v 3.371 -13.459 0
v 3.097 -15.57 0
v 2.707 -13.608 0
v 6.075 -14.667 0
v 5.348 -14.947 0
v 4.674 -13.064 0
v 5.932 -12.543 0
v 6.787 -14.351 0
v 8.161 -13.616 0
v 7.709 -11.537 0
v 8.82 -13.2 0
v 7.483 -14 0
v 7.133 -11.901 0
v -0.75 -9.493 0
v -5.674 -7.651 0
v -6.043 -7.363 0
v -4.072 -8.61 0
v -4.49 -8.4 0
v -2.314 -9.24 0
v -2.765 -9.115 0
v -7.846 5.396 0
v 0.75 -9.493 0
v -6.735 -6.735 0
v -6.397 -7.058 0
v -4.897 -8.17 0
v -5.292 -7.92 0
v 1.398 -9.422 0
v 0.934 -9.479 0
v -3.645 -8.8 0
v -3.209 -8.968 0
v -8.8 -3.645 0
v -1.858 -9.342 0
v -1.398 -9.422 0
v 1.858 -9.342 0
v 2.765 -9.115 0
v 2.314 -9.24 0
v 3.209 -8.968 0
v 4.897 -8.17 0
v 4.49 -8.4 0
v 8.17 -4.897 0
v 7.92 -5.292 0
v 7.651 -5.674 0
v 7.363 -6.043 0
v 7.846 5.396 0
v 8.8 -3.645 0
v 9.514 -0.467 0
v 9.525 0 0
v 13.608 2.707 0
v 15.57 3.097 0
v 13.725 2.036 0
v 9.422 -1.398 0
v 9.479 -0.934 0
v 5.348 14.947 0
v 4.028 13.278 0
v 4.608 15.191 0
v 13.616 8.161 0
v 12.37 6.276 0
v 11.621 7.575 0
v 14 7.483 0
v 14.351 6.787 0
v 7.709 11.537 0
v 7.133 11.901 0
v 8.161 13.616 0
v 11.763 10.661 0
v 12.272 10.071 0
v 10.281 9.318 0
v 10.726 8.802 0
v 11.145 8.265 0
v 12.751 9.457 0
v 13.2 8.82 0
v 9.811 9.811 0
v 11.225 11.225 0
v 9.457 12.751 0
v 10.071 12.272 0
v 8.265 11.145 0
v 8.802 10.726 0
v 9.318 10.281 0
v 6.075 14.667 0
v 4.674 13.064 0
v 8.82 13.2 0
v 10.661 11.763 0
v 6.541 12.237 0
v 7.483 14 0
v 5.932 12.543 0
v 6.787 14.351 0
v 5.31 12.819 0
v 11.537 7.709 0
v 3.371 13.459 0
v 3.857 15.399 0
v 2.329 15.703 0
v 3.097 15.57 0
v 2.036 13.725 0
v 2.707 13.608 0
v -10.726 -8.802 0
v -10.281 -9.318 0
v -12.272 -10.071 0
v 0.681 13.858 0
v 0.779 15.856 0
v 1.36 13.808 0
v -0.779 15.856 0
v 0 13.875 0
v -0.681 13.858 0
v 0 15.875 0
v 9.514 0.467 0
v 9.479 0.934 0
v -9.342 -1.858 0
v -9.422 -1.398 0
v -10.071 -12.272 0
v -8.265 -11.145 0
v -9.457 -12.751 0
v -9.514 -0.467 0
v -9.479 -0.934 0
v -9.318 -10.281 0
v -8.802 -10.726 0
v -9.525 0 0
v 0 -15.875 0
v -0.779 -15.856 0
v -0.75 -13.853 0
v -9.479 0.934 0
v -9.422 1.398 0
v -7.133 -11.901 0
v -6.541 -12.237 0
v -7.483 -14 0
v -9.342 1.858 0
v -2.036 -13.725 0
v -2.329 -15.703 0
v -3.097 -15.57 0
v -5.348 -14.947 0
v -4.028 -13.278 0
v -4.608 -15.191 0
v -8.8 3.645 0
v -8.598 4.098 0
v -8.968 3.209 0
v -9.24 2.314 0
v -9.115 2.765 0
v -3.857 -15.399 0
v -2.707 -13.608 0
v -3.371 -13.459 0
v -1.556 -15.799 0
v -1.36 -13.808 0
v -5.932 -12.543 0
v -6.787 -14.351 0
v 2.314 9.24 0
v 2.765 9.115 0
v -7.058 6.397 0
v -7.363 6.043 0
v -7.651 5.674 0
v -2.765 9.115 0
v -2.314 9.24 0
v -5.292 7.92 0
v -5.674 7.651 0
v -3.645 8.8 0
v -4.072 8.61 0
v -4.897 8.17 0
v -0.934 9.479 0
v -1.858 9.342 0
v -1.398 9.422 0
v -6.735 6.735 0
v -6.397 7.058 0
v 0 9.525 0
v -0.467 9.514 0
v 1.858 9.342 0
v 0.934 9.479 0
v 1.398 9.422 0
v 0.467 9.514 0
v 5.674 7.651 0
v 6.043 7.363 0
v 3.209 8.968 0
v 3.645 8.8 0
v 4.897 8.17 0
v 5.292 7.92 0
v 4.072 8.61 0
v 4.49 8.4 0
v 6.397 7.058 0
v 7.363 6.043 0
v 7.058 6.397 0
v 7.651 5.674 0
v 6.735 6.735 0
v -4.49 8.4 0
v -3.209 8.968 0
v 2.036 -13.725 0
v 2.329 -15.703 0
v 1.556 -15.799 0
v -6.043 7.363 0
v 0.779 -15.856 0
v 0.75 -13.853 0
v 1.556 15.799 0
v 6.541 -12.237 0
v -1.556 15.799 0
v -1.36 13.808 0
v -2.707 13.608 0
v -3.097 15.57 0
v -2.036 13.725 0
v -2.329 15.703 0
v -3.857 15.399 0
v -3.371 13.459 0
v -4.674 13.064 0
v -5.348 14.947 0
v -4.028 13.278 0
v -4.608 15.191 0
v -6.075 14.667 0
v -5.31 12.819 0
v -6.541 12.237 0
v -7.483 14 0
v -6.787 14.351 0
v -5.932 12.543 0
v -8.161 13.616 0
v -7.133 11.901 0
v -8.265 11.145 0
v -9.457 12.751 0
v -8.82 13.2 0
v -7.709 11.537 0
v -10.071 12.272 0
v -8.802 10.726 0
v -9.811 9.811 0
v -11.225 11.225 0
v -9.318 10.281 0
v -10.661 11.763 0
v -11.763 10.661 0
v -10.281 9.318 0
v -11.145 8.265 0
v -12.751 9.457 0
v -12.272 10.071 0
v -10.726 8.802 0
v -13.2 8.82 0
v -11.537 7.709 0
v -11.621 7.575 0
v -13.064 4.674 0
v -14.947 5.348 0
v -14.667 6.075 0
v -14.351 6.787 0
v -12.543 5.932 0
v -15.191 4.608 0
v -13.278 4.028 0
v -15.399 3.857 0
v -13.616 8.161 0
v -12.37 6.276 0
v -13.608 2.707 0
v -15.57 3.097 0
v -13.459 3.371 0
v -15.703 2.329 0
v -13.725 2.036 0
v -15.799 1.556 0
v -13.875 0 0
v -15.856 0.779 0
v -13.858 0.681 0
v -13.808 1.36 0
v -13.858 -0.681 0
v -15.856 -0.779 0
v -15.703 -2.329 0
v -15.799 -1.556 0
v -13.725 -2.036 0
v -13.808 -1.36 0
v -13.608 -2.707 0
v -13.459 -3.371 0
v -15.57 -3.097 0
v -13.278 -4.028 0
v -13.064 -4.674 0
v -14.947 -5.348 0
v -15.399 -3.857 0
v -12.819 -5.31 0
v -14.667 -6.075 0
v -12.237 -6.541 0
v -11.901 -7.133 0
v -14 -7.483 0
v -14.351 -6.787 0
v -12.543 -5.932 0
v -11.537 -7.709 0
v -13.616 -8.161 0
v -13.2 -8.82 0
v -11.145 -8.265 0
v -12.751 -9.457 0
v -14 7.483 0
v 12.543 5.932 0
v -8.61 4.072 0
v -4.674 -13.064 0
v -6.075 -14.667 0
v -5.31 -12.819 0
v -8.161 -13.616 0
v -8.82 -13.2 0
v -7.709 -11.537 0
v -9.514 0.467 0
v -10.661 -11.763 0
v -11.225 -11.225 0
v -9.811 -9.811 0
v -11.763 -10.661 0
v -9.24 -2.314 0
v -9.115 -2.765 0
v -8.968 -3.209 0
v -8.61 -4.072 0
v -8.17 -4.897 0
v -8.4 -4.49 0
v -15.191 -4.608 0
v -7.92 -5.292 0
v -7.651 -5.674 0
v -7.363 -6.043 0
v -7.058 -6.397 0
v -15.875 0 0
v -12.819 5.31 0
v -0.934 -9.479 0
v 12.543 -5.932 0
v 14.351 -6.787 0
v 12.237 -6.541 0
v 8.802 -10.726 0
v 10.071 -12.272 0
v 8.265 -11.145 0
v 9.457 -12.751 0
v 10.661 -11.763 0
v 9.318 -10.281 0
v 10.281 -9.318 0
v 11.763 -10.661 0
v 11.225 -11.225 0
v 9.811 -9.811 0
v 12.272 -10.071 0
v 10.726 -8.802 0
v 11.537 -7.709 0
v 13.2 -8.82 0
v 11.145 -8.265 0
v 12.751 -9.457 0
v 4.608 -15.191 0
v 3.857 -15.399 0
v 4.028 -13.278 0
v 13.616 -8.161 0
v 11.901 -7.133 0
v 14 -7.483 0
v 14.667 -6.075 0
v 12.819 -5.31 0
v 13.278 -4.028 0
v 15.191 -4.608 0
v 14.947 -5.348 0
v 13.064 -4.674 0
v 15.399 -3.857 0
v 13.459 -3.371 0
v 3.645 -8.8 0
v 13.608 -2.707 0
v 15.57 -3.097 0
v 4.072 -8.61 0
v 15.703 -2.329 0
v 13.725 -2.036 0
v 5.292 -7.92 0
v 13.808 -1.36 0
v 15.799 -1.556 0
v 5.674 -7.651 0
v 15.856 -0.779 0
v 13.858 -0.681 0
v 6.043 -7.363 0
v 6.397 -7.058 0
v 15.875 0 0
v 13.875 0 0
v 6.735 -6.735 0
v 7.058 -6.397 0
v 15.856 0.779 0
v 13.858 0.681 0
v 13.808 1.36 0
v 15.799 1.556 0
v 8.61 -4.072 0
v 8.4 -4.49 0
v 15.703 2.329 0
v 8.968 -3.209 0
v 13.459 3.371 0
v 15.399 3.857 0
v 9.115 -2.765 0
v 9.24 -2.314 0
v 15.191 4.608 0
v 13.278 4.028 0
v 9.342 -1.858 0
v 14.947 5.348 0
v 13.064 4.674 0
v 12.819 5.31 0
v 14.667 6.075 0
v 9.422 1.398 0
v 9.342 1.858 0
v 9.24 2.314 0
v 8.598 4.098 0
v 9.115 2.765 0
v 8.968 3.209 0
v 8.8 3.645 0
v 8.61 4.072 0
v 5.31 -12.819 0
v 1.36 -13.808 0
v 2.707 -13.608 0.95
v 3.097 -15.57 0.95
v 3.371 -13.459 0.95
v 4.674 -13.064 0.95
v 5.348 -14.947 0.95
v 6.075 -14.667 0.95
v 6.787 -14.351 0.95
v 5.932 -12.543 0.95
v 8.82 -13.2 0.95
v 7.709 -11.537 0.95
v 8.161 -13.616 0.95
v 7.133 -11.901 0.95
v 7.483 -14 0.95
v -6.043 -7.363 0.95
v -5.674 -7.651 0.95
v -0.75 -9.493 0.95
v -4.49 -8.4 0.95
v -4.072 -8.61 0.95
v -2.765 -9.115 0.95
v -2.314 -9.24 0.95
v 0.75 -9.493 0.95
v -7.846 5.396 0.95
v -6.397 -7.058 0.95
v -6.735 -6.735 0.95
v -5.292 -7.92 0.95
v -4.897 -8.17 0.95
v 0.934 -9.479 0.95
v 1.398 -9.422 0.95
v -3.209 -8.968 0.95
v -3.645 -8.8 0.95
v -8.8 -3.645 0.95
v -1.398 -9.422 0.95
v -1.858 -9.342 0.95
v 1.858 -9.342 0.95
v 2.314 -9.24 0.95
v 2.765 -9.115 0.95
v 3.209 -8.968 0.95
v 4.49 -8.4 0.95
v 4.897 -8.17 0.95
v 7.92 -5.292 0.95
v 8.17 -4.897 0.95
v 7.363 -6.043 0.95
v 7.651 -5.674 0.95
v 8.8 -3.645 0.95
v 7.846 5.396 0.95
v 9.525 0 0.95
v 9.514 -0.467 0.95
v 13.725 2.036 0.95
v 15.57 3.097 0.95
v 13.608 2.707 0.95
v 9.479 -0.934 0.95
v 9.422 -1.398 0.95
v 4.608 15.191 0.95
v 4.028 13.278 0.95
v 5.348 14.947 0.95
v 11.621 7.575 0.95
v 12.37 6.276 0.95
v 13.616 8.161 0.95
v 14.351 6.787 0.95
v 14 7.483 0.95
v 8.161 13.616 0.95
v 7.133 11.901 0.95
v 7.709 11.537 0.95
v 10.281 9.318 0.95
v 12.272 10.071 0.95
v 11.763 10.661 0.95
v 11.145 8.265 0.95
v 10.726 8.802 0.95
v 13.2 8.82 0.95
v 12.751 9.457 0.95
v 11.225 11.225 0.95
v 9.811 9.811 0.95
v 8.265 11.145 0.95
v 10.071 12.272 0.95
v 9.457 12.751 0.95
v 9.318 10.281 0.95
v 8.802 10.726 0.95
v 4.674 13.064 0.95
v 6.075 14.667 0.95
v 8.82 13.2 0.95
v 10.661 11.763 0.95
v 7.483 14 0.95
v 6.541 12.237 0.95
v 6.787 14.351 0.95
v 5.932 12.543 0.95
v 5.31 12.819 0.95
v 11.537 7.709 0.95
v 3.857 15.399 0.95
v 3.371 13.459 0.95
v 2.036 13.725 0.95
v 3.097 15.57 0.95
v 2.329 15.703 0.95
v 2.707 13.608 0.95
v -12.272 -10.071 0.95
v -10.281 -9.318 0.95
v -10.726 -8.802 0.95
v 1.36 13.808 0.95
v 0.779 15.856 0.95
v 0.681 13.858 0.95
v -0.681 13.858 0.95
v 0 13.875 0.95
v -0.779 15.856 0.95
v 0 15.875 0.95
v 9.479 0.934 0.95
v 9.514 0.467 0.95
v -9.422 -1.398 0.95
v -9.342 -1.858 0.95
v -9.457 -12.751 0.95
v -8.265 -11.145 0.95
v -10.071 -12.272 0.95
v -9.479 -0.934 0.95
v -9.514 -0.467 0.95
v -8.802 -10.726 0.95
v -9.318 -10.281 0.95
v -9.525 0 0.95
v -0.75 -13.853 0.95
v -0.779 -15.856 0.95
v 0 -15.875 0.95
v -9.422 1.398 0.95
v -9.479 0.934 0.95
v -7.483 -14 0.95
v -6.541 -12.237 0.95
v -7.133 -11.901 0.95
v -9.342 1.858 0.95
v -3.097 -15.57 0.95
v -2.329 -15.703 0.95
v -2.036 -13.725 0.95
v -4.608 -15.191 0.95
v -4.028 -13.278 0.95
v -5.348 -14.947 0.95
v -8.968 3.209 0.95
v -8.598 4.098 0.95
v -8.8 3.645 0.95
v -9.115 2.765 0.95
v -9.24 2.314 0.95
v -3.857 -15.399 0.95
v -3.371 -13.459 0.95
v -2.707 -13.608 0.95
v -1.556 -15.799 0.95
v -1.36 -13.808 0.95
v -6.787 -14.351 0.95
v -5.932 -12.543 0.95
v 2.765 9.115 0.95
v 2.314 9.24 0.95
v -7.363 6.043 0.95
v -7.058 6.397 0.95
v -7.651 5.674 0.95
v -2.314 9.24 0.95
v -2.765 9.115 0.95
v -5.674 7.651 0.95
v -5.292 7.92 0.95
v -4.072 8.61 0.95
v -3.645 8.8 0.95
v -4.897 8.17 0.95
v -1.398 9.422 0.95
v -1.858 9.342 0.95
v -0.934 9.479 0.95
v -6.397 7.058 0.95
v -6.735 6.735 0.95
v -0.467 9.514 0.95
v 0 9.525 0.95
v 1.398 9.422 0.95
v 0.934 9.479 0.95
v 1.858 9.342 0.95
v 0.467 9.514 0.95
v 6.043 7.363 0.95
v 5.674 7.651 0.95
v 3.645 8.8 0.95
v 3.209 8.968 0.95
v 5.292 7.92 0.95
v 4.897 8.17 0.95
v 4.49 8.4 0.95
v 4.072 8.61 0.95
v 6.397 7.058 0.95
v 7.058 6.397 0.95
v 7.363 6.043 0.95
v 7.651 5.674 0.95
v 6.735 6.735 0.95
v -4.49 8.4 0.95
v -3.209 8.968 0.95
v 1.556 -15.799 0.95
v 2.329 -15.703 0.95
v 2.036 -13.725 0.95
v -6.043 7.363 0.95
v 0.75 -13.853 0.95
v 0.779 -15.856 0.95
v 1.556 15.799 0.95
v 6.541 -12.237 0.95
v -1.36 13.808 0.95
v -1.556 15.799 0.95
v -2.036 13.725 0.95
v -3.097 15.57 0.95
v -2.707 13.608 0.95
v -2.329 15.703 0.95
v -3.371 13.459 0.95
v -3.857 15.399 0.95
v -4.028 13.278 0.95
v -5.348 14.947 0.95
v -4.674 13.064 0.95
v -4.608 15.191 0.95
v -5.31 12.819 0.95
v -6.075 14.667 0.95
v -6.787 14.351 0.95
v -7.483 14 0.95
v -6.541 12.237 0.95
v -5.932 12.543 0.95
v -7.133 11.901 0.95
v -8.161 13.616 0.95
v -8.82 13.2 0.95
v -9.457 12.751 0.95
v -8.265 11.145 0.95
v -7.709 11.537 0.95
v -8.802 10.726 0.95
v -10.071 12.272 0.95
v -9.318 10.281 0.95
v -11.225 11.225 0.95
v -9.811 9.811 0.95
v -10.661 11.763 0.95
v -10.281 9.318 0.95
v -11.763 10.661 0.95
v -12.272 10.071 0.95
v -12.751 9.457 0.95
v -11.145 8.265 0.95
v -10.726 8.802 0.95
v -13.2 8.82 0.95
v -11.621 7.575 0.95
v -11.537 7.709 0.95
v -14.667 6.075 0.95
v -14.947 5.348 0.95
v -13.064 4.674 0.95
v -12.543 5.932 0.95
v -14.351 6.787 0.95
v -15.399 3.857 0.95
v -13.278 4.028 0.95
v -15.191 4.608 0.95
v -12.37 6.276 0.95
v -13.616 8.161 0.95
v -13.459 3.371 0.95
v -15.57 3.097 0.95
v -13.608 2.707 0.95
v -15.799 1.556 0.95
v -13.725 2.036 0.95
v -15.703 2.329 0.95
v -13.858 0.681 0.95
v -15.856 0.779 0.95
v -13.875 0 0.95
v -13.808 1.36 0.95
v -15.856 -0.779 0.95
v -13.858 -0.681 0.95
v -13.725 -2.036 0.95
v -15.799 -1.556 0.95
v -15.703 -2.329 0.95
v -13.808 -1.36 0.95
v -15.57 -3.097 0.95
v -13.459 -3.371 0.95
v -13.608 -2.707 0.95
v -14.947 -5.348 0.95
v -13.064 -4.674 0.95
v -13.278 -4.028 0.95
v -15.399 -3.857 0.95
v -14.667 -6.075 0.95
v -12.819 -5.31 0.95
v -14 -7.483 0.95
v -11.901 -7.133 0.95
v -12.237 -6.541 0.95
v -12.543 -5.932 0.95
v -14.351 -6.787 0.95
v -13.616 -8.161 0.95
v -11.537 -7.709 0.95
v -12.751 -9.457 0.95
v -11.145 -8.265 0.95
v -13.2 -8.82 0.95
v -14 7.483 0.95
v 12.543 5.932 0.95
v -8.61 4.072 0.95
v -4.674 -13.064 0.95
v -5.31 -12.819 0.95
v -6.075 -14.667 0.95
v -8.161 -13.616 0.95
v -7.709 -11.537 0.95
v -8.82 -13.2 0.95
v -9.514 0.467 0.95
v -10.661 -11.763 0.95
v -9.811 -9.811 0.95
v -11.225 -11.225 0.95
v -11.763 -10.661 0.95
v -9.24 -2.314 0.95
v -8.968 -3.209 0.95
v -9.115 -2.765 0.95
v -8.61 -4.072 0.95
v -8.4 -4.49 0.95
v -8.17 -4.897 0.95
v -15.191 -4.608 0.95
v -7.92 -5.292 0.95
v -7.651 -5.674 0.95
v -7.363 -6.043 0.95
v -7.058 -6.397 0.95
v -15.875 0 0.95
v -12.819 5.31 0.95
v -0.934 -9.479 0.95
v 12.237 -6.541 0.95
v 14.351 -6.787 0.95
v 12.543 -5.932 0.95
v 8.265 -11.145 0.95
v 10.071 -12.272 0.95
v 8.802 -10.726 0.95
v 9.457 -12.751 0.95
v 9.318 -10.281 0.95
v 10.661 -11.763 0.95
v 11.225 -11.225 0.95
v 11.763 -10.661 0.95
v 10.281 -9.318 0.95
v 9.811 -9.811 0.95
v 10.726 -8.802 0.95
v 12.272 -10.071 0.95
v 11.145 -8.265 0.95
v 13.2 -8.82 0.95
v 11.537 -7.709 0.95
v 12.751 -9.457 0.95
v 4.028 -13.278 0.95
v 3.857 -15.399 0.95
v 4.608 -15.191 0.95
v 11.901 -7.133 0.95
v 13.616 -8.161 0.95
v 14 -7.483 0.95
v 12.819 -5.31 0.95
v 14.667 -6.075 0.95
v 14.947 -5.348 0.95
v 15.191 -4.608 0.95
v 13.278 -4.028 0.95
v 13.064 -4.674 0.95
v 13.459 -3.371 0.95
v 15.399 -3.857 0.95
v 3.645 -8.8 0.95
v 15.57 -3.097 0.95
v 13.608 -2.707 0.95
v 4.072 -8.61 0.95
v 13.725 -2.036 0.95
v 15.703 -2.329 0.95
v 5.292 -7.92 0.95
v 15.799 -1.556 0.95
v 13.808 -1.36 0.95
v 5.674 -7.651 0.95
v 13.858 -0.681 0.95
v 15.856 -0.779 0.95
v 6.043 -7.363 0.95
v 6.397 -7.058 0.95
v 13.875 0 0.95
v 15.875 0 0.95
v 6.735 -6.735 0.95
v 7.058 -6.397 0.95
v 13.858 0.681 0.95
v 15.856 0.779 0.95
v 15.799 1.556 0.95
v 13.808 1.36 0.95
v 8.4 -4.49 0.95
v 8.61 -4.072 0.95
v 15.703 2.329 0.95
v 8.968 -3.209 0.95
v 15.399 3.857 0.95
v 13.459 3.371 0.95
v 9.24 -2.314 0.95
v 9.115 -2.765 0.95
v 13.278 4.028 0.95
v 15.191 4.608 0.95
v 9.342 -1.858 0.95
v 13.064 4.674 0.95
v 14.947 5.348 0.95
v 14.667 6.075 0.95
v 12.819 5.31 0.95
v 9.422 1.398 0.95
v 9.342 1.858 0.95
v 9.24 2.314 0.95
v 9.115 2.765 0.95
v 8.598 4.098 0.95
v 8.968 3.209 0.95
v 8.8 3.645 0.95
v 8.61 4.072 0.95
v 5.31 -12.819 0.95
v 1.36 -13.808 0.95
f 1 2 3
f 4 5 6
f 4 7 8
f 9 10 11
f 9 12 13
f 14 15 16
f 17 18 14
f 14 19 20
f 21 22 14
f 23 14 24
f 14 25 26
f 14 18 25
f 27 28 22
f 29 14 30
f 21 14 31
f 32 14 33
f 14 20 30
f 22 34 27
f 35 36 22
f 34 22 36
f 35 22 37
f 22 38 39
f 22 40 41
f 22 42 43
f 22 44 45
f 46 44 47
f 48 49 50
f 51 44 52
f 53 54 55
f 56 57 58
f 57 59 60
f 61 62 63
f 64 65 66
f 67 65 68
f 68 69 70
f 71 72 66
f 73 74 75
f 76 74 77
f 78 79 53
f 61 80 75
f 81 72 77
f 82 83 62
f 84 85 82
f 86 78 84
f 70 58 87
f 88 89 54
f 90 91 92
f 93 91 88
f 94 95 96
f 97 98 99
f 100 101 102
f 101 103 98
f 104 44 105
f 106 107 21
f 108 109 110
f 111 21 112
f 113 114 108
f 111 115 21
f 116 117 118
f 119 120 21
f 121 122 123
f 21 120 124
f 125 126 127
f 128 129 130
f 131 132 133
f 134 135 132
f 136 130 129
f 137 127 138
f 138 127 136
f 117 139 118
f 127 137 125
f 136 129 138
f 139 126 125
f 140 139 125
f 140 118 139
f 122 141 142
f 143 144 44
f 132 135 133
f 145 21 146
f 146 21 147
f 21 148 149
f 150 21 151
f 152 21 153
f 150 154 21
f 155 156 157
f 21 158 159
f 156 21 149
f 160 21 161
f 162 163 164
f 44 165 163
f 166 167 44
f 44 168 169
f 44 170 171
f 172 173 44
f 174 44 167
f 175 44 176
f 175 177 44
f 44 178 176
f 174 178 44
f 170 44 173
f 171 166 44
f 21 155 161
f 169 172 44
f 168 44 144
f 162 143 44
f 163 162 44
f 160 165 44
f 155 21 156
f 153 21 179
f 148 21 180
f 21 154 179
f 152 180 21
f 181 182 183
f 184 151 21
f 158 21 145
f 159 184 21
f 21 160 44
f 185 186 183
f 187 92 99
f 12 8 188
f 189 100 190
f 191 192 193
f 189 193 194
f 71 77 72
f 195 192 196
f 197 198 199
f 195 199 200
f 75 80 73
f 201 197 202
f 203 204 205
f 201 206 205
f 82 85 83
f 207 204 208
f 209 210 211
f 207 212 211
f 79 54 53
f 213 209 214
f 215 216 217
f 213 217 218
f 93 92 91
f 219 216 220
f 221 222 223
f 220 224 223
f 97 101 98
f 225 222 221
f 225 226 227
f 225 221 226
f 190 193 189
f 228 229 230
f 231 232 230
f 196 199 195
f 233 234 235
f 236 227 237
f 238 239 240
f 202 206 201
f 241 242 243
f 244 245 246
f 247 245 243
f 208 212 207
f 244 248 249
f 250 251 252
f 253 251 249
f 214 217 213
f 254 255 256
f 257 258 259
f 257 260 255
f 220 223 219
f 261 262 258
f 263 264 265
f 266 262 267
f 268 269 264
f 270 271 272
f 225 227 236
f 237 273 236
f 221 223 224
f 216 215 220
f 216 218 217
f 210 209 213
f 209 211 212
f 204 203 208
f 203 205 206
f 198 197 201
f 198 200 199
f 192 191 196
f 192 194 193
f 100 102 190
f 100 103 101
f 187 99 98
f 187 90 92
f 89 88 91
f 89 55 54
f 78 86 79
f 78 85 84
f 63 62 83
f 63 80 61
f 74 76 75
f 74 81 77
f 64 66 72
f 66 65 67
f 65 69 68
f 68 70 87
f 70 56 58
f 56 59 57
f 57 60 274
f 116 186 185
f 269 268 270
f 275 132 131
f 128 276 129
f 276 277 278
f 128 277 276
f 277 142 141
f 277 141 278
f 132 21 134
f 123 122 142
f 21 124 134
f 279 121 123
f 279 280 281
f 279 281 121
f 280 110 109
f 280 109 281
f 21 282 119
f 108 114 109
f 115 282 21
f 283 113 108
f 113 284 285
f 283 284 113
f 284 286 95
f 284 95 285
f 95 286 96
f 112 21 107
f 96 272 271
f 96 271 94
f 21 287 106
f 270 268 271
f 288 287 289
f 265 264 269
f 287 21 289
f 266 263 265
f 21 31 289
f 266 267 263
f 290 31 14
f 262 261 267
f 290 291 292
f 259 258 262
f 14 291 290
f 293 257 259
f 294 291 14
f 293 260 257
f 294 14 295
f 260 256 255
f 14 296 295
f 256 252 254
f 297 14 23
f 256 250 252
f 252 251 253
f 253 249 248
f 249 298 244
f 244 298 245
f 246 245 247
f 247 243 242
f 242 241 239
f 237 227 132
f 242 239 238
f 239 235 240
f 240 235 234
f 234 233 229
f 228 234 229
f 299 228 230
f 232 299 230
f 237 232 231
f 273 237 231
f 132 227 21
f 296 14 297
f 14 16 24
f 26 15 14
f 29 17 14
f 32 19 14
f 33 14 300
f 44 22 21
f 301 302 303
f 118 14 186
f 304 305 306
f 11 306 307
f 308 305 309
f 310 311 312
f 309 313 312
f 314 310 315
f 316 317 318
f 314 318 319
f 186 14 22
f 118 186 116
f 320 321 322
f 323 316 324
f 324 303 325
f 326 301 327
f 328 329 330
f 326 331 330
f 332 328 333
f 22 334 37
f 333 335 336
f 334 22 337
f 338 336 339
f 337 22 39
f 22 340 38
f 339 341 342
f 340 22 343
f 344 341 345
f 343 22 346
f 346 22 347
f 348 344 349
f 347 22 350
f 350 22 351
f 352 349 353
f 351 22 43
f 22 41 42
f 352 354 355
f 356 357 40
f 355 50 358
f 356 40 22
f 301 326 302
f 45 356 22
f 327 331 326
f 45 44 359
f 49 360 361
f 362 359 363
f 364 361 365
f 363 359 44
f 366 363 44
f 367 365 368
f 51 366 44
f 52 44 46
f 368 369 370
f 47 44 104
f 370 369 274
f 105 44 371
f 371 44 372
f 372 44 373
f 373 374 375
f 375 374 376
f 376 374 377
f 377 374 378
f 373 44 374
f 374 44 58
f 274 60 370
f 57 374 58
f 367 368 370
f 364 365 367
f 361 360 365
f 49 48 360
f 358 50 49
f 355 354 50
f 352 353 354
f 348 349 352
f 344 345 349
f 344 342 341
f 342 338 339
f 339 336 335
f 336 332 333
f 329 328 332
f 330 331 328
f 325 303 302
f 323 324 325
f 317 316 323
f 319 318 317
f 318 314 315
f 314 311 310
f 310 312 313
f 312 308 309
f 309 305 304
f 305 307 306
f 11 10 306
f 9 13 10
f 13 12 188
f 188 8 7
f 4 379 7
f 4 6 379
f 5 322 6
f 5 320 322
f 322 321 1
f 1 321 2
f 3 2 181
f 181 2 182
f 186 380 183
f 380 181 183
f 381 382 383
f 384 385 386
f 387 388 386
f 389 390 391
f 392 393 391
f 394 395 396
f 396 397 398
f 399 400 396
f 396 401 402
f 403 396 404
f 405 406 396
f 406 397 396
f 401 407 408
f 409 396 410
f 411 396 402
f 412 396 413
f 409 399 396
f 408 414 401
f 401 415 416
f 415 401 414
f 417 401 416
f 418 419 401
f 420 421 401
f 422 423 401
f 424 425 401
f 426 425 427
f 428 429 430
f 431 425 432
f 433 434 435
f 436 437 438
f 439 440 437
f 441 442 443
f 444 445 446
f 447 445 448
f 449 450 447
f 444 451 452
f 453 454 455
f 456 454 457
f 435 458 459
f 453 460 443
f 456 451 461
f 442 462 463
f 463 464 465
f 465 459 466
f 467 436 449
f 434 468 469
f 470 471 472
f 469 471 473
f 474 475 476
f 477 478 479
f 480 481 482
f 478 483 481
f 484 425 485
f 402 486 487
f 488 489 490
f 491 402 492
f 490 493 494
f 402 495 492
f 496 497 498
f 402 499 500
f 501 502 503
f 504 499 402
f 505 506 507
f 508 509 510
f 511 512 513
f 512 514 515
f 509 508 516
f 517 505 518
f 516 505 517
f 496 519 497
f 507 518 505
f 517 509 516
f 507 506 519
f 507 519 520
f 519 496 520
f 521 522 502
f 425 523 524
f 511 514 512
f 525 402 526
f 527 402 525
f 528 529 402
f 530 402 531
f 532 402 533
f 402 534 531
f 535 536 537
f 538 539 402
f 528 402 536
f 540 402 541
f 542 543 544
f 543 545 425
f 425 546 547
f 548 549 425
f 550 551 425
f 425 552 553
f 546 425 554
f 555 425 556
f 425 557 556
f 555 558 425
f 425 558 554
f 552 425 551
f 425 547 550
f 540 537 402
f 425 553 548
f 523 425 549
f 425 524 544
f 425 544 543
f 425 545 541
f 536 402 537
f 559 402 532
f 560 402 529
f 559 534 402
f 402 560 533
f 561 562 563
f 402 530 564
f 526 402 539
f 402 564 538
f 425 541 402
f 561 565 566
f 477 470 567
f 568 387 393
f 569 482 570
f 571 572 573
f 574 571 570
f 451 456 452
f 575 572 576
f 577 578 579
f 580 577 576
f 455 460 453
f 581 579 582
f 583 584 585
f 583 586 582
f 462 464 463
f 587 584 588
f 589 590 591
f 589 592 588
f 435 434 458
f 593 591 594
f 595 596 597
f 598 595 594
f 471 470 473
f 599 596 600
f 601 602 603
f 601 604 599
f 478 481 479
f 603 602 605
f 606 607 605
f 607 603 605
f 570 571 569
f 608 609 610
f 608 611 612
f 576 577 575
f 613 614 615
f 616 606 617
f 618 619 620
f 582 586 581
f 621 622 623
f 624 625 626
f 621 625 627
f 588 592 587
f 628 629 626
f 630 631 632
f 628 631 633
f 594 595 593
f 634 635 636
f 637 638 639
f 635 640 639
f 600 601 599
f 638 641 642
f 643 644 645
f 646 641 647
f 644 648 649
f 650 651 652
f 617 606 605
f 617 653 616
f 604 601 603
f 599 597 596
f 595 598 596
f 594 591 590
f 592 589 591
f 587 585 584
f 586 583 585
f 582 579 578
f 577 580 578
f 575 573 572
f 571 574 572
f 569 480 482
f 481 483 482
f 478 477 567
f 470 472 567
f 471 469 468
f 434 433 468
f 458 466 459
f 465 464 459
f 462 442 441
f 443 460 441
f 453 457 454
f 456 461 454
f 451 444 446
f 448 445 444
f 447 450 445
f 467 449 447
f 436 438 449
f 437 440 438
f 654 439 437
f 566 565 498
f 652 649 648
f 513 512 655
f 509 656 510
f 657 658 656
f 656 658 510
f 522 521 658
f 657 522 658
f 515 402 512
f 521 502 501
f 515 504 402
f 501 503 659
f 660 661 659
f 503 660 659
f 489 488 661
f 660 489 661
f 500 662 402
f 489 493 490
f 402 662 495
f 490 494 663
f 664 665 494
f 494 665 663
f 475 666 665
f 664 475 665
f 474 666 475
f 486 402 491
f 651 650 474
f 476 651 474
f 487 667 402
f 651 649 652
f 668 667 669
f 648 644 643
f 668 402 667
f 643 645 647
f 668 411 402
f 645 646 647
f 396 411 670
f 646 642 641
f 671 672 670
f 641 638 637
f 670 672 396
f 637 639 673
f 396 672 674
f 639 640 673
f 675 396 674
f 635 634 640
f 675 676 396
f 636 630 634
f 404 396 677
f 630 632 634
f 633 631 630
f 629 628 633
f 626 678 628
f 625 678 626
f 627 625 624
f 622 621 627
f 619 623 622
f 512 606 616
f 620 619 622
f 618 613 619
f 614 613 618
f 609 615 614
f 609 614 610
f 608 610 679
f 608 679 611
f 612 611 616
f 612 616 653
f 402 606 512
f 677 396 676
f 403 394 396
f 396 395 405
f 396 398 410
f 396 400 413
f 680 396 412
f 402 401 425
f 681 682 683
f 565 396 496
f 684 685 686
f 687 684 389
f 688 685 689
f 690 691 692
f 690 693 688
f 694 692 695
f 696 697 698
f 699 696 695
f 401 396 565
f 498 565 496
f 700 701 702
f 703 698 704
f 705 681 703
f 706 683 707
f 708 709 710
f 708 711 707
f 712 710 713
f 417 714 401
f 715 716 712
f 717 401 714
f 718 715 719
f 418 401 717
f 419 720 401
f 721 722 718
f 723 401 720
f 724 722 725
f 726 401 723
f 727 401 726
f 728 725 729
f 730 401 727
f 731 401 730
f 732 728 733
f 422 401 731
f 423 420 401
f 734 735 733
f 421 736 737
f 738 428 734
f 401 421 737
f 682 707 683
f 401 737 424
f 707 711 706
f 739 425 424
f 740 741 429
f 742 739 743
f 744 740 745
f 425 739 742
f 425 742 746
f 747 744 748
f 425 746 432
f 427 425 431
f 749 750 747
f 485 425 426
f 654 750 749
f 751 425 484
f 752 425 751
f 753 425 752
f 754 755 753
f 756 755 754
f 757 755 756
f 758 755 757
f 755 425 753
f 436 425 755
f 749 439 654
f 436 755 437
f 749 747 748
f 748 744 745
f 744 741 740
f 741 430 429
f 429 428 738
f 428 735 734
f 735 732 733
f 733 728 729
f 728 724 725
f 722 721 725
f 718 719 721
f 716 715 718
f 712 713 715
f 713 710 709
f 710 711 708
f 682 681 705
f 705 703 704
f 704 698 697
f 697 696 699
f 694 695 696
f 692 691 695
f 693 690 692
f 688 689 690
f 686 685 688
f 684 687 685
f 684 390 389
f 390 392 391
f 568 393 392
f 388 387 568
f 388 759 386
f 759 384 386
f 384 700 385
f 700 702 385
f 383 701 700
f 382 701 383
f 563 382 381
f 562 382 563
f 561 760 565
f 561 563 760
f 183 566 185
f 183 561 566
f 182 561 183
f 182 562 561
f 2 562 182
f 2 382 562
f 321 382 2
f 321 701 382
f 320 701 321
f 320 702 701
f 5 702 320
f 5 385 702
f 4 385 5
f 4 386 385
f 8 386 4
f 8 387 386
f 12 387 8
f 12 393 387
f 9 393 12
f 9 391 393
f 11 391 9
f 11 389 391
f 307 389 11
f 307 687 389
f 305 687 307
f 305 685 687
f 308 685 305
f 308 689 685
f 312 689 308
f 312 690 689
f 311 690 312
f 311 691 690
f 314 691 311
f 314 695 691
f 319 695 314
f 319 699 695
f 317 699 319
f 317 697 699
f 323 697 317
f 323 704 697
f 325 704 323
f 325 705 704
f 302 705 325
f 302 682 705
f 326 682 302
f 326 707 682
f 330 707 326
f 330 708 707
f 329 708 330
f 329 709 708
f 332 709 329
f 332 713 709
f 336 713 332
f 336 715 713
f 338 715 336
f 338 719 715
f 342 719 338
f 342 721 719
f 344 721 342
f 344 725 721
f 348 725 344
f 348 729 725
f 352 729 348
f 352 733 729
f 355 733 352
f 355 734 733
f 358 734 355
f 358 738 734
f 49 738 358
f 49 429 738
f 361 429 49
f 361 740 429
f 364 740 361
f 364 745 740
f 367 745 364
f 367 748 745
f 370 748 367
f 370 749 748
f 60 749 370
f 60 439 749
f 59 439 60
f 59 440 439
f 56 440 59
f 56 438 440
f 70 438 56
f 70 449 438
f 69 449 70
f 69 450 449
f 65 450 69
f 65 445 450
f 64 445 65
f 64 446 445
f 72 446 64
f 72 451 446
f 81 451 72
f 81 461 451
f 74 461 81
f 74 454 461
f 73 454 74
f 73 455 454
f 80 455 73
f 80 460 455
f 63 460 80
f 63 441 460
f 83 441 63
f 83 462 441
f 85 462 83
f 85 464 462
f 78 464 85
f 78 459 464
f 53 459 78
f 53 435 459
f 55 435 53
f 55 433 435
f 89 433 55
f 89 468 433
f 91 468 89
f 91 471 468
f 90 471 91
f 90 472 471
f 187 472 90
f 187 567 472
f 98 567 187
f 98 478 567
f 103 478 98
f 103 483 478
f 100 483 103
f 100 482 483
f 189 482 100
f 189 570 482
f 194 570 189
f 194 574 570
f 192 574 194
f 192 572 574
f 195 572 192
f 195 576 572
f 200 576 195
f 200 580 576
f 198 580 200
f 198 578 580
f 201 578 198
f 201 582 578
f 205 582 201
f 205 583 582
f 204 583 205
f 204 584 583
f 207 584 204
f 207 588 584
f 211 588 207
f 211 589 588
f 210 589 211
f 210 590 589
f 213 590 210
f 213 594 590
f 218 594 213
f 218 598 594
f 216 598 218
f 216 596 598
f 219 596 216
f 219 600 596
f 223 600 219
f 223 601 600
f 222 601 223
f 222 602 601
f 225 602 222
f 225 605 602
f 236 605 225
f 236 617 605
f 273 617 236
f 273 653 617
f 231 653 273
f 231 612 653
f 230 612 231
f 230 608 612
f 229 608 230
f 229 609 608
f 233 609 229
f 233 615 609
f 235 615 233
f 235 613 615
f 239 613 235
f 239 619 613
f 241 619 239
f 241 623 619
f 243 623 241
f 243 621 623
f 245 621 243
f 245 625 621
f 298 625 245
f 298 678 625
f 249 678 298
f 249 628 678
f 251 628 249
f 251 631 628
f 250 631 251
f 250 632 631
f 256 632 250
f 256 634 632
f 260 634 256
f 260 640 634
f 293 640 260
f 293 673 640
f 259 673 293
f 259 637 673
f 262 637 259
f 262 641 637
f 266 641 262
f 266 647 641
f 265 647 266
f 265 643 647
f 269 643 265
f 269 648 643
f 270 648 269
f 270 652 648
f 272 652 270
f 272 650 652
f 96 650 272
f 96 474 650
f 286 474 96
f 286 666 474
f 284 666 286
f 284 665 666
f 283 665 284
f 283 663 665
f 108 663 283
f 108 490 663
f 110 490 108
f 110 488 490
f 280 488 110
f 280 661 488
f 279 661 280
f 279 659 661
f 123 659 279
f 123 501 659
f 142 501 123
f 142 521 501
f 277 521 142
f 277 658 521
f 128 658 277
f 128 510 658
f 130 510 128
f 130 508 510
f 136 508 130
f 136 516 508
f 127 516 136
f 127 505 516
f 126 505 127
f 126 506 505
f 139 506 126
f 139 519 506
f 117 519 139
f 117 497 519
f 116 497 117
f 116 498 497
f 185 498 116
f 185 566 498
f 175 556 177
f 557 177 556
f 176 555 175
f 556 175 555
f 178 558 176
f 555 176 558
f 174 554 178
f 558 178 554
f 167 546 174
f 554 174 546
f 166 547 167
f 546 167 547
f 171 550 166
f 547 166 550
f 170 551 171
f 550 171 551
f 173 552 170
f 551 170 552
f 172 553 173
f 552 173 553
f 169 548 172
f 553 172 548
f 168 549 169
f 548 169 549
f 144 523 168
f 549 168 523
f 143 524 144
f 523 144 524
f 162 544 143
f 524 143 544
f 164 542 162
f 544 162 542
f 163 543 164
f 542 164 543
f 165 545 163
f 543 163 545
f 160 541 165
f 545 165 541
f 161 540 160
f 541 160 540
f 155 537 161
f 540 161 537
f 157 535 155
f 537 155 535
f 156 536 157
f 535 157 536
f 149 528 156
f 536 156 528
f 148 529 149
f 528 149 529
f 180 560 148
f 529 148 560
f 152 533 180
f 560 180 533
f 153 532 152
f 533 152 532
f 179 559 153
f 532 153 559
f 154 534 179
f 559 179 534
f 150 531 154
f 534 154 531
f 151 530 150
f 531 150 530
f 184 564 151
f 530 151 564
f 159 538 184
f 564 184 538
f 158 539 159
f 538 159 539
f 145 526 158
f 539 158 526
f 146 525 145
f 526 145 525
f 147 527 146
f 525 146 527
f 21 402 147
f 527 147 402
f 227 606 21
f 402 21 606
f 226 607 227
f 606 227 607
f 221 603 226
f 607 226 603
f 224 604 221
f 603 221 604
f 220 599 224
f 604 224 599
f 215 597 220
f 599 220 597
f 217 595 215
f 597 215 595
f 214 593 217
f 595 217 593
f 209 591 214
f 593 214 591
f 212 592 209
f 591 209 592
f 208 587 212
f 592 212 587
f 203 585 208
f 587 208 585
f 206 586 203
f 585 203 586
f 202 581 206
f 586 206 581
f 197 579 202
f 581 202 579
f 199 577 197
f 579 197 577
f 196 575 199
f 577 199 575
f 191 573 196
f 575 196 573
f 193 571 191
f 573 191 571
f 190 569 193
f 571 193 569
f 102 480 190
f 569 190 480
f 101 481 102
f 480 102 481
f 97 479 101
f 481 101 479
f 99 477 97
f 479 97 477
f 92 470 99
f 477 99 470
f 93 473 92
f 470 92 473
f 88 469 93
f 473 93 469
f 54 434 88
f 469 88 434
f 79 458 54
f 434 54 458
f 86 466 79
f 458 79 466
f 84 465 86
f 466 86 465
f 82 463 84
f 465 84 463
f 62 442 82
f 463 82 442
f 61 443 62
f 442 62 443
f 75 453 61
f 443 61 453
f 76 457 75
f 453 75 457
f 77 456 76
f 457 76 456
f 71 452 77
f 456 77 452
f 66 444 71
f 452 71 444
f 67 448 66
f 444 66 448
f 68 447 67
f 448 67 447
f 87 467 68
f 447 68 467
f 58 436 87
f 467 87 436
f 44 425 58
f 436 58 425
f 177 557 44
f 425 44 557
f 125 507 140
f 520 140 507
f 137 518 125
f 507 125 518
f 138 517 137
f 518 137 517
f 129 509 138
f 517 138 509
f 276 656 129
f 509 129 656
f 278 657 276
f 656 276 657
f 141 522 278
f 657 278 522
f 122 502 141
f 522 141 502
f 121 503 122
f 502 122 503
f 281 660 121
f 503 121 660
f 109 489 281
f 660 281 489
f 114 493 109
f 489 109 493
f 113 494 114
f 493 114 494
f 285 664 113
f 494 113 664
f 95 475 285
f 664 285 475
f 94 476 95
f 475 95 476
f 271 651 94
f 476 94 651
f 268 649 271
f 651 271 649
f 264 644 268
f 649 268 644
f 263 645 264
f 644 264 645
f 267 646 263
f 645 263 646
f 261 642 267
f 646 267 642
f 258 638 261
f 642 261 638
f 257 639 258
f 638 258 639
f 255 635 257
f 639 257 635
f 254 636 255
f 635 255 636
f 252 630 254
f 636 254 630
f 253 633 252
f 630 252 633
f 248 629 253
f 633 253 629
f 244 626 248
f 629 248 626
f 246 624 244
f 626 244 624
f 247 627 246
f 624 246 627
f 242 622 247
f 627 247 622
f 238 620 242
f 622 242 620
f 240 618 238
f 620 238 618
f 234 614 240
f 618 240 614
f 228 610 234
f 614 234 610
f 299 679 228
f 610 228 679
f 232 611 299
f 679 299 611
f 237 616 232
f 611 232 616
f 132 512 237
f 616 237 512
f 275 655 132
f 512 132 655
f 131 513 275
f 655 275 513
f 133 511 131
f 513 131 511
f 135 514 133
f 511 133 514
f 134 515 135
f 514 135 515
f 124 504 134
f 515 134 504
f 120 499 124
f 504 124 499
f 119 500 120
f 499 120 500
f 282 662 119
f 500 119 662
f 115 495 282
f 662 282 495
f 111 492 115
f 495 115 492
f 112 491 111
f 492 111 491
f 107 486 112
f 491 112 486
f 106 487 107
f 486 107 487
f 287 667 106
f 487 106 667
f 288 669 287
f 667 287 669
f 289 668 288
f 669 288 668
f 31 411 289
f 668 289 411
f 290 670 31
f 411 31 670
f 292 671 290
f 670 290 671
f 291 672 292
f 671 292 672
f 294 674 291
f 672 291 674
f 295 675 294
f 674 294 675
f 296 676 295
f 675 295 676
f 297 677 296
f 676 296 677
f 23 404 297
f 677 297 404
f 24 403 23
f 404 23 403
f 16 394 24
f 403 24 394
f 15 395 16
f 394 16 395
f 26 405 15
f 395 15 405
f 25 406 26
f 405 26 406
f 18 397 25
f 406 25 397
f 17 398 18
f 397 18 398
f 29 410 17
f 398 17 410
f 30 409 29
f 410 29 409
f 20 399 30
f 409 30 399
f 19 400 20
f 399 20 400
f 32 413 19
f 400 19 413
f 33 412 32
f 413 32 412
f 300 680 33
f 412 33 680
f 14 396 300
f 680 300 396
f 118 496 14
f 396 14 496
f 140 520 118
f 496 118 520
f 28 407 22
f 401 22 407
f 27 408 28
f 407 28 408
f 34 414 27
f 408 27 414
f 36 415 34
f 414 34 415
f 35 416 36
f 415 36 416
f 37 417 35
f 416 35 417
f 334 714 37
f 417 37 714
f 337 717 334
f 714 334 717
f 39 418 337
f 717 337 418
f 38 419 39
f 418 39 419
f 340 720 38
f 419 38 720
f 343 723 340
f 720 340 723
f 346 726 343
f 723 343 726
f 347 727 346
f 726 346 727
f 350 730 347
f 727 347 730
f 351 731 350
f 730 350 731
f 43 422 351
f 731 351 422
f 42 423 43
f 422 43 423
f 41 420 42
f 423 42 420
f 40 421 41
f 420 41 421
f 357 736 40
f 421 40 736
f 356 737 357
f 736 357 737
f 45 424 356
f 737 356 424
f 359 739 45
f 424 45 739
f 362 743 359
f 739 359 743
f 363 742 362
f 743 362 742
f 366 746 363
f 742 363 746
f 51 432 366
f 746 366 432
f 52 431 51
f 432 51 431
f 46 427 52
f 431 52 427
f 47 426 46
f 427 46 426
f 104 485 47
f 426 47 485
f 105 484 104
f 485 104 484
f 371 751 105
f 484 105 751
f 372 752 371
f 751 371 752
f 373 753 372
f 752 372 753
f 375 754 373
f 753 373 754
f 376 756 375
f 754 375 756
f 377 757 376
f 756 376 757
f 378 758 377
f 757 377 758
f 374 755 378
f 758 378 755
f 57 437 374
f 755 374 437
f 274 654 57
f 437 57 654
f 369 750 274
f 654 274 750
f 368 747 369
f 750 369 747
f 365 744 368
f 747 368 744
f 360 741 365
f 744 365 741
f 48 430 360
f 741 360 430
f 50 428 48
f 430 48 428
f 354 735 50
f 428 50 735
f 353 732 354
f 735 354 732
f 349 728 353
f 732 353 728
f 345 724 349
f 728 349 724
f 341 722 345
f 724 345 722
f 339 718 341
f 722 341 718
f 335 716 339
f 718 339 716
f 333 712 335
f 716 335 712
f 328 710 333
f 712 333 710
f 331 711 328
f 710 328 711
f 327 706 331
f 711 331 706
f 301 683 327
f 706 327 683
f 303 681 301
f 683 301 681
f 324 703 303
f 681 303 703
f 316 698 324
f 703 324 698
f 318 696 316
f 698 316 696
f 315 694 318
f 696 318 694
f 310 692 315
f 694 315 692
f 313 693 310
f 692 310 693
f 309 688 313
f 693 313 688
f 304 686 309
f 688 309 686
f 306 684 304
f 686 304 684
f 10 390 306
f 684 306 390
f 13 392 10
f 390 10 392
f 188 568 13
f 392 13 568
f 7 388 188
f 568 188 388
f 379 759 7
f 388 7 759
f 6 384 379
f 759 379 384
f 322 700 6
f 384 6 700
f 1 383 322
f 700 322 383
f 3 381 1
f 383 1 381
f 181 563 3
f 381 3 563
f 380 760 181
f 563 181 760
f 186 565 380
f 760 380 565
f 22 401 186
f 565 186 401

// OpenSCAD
diameter = 31.75;
spotDiameterRatio = 0.6;
rim = 2;
strut = 1.5;
thickness = 0.95;
mode = 0; // [0:central dark,1:off-center hole,2:sector]
handle = 0; //[0:no,1:yes]

module dummy() {}

innerRadius = diameter/2-rim;

$fn = 128;

module handle() {
    hull() {
        circle(d=diameter/2);
        translate([0,diameter]) circle(d=diameter/2);
    }
}

module sector(r1=5,r2=10,startAngle=-30,endAngle=30) {
    function arc(r,start,end) = [for (i=[0:$fn]) let(angle=start+(end-start)*i/$fn) r*[cos(angle),sin(angle)]];
    polygon(concat(arc(r2,startAngle,endAngle),arc(r1,endAngle,startAngle)));
}

module basic() {
    difference() {
        union() {
            circle(d=diameter);
            if (handle) handle();
        }
        if (mode==1)
            translate([(innerRadius-spotDiameterRatio*diameter/2),0]) circle(d=spotDiameterRatio*diameter);
        else if (mode==0)
            circle(d=diameter-rim*2);
        else if (mode==2) {
            sector(r1=spotDiameterRatio*diameter/2,r2=innerRadius,startAngle=270-60,endAngle=270+60);
        }
    }
    if (mode==0) {
        circle(d=spotDiameterRatio*diameter);
        for (a=[0,120,240]) rotate(30+a) translate([0,-strut/2]) square([diameter/2-rim/2,strut]);
    }
}

linear_extrude(height=thickness) basic();
